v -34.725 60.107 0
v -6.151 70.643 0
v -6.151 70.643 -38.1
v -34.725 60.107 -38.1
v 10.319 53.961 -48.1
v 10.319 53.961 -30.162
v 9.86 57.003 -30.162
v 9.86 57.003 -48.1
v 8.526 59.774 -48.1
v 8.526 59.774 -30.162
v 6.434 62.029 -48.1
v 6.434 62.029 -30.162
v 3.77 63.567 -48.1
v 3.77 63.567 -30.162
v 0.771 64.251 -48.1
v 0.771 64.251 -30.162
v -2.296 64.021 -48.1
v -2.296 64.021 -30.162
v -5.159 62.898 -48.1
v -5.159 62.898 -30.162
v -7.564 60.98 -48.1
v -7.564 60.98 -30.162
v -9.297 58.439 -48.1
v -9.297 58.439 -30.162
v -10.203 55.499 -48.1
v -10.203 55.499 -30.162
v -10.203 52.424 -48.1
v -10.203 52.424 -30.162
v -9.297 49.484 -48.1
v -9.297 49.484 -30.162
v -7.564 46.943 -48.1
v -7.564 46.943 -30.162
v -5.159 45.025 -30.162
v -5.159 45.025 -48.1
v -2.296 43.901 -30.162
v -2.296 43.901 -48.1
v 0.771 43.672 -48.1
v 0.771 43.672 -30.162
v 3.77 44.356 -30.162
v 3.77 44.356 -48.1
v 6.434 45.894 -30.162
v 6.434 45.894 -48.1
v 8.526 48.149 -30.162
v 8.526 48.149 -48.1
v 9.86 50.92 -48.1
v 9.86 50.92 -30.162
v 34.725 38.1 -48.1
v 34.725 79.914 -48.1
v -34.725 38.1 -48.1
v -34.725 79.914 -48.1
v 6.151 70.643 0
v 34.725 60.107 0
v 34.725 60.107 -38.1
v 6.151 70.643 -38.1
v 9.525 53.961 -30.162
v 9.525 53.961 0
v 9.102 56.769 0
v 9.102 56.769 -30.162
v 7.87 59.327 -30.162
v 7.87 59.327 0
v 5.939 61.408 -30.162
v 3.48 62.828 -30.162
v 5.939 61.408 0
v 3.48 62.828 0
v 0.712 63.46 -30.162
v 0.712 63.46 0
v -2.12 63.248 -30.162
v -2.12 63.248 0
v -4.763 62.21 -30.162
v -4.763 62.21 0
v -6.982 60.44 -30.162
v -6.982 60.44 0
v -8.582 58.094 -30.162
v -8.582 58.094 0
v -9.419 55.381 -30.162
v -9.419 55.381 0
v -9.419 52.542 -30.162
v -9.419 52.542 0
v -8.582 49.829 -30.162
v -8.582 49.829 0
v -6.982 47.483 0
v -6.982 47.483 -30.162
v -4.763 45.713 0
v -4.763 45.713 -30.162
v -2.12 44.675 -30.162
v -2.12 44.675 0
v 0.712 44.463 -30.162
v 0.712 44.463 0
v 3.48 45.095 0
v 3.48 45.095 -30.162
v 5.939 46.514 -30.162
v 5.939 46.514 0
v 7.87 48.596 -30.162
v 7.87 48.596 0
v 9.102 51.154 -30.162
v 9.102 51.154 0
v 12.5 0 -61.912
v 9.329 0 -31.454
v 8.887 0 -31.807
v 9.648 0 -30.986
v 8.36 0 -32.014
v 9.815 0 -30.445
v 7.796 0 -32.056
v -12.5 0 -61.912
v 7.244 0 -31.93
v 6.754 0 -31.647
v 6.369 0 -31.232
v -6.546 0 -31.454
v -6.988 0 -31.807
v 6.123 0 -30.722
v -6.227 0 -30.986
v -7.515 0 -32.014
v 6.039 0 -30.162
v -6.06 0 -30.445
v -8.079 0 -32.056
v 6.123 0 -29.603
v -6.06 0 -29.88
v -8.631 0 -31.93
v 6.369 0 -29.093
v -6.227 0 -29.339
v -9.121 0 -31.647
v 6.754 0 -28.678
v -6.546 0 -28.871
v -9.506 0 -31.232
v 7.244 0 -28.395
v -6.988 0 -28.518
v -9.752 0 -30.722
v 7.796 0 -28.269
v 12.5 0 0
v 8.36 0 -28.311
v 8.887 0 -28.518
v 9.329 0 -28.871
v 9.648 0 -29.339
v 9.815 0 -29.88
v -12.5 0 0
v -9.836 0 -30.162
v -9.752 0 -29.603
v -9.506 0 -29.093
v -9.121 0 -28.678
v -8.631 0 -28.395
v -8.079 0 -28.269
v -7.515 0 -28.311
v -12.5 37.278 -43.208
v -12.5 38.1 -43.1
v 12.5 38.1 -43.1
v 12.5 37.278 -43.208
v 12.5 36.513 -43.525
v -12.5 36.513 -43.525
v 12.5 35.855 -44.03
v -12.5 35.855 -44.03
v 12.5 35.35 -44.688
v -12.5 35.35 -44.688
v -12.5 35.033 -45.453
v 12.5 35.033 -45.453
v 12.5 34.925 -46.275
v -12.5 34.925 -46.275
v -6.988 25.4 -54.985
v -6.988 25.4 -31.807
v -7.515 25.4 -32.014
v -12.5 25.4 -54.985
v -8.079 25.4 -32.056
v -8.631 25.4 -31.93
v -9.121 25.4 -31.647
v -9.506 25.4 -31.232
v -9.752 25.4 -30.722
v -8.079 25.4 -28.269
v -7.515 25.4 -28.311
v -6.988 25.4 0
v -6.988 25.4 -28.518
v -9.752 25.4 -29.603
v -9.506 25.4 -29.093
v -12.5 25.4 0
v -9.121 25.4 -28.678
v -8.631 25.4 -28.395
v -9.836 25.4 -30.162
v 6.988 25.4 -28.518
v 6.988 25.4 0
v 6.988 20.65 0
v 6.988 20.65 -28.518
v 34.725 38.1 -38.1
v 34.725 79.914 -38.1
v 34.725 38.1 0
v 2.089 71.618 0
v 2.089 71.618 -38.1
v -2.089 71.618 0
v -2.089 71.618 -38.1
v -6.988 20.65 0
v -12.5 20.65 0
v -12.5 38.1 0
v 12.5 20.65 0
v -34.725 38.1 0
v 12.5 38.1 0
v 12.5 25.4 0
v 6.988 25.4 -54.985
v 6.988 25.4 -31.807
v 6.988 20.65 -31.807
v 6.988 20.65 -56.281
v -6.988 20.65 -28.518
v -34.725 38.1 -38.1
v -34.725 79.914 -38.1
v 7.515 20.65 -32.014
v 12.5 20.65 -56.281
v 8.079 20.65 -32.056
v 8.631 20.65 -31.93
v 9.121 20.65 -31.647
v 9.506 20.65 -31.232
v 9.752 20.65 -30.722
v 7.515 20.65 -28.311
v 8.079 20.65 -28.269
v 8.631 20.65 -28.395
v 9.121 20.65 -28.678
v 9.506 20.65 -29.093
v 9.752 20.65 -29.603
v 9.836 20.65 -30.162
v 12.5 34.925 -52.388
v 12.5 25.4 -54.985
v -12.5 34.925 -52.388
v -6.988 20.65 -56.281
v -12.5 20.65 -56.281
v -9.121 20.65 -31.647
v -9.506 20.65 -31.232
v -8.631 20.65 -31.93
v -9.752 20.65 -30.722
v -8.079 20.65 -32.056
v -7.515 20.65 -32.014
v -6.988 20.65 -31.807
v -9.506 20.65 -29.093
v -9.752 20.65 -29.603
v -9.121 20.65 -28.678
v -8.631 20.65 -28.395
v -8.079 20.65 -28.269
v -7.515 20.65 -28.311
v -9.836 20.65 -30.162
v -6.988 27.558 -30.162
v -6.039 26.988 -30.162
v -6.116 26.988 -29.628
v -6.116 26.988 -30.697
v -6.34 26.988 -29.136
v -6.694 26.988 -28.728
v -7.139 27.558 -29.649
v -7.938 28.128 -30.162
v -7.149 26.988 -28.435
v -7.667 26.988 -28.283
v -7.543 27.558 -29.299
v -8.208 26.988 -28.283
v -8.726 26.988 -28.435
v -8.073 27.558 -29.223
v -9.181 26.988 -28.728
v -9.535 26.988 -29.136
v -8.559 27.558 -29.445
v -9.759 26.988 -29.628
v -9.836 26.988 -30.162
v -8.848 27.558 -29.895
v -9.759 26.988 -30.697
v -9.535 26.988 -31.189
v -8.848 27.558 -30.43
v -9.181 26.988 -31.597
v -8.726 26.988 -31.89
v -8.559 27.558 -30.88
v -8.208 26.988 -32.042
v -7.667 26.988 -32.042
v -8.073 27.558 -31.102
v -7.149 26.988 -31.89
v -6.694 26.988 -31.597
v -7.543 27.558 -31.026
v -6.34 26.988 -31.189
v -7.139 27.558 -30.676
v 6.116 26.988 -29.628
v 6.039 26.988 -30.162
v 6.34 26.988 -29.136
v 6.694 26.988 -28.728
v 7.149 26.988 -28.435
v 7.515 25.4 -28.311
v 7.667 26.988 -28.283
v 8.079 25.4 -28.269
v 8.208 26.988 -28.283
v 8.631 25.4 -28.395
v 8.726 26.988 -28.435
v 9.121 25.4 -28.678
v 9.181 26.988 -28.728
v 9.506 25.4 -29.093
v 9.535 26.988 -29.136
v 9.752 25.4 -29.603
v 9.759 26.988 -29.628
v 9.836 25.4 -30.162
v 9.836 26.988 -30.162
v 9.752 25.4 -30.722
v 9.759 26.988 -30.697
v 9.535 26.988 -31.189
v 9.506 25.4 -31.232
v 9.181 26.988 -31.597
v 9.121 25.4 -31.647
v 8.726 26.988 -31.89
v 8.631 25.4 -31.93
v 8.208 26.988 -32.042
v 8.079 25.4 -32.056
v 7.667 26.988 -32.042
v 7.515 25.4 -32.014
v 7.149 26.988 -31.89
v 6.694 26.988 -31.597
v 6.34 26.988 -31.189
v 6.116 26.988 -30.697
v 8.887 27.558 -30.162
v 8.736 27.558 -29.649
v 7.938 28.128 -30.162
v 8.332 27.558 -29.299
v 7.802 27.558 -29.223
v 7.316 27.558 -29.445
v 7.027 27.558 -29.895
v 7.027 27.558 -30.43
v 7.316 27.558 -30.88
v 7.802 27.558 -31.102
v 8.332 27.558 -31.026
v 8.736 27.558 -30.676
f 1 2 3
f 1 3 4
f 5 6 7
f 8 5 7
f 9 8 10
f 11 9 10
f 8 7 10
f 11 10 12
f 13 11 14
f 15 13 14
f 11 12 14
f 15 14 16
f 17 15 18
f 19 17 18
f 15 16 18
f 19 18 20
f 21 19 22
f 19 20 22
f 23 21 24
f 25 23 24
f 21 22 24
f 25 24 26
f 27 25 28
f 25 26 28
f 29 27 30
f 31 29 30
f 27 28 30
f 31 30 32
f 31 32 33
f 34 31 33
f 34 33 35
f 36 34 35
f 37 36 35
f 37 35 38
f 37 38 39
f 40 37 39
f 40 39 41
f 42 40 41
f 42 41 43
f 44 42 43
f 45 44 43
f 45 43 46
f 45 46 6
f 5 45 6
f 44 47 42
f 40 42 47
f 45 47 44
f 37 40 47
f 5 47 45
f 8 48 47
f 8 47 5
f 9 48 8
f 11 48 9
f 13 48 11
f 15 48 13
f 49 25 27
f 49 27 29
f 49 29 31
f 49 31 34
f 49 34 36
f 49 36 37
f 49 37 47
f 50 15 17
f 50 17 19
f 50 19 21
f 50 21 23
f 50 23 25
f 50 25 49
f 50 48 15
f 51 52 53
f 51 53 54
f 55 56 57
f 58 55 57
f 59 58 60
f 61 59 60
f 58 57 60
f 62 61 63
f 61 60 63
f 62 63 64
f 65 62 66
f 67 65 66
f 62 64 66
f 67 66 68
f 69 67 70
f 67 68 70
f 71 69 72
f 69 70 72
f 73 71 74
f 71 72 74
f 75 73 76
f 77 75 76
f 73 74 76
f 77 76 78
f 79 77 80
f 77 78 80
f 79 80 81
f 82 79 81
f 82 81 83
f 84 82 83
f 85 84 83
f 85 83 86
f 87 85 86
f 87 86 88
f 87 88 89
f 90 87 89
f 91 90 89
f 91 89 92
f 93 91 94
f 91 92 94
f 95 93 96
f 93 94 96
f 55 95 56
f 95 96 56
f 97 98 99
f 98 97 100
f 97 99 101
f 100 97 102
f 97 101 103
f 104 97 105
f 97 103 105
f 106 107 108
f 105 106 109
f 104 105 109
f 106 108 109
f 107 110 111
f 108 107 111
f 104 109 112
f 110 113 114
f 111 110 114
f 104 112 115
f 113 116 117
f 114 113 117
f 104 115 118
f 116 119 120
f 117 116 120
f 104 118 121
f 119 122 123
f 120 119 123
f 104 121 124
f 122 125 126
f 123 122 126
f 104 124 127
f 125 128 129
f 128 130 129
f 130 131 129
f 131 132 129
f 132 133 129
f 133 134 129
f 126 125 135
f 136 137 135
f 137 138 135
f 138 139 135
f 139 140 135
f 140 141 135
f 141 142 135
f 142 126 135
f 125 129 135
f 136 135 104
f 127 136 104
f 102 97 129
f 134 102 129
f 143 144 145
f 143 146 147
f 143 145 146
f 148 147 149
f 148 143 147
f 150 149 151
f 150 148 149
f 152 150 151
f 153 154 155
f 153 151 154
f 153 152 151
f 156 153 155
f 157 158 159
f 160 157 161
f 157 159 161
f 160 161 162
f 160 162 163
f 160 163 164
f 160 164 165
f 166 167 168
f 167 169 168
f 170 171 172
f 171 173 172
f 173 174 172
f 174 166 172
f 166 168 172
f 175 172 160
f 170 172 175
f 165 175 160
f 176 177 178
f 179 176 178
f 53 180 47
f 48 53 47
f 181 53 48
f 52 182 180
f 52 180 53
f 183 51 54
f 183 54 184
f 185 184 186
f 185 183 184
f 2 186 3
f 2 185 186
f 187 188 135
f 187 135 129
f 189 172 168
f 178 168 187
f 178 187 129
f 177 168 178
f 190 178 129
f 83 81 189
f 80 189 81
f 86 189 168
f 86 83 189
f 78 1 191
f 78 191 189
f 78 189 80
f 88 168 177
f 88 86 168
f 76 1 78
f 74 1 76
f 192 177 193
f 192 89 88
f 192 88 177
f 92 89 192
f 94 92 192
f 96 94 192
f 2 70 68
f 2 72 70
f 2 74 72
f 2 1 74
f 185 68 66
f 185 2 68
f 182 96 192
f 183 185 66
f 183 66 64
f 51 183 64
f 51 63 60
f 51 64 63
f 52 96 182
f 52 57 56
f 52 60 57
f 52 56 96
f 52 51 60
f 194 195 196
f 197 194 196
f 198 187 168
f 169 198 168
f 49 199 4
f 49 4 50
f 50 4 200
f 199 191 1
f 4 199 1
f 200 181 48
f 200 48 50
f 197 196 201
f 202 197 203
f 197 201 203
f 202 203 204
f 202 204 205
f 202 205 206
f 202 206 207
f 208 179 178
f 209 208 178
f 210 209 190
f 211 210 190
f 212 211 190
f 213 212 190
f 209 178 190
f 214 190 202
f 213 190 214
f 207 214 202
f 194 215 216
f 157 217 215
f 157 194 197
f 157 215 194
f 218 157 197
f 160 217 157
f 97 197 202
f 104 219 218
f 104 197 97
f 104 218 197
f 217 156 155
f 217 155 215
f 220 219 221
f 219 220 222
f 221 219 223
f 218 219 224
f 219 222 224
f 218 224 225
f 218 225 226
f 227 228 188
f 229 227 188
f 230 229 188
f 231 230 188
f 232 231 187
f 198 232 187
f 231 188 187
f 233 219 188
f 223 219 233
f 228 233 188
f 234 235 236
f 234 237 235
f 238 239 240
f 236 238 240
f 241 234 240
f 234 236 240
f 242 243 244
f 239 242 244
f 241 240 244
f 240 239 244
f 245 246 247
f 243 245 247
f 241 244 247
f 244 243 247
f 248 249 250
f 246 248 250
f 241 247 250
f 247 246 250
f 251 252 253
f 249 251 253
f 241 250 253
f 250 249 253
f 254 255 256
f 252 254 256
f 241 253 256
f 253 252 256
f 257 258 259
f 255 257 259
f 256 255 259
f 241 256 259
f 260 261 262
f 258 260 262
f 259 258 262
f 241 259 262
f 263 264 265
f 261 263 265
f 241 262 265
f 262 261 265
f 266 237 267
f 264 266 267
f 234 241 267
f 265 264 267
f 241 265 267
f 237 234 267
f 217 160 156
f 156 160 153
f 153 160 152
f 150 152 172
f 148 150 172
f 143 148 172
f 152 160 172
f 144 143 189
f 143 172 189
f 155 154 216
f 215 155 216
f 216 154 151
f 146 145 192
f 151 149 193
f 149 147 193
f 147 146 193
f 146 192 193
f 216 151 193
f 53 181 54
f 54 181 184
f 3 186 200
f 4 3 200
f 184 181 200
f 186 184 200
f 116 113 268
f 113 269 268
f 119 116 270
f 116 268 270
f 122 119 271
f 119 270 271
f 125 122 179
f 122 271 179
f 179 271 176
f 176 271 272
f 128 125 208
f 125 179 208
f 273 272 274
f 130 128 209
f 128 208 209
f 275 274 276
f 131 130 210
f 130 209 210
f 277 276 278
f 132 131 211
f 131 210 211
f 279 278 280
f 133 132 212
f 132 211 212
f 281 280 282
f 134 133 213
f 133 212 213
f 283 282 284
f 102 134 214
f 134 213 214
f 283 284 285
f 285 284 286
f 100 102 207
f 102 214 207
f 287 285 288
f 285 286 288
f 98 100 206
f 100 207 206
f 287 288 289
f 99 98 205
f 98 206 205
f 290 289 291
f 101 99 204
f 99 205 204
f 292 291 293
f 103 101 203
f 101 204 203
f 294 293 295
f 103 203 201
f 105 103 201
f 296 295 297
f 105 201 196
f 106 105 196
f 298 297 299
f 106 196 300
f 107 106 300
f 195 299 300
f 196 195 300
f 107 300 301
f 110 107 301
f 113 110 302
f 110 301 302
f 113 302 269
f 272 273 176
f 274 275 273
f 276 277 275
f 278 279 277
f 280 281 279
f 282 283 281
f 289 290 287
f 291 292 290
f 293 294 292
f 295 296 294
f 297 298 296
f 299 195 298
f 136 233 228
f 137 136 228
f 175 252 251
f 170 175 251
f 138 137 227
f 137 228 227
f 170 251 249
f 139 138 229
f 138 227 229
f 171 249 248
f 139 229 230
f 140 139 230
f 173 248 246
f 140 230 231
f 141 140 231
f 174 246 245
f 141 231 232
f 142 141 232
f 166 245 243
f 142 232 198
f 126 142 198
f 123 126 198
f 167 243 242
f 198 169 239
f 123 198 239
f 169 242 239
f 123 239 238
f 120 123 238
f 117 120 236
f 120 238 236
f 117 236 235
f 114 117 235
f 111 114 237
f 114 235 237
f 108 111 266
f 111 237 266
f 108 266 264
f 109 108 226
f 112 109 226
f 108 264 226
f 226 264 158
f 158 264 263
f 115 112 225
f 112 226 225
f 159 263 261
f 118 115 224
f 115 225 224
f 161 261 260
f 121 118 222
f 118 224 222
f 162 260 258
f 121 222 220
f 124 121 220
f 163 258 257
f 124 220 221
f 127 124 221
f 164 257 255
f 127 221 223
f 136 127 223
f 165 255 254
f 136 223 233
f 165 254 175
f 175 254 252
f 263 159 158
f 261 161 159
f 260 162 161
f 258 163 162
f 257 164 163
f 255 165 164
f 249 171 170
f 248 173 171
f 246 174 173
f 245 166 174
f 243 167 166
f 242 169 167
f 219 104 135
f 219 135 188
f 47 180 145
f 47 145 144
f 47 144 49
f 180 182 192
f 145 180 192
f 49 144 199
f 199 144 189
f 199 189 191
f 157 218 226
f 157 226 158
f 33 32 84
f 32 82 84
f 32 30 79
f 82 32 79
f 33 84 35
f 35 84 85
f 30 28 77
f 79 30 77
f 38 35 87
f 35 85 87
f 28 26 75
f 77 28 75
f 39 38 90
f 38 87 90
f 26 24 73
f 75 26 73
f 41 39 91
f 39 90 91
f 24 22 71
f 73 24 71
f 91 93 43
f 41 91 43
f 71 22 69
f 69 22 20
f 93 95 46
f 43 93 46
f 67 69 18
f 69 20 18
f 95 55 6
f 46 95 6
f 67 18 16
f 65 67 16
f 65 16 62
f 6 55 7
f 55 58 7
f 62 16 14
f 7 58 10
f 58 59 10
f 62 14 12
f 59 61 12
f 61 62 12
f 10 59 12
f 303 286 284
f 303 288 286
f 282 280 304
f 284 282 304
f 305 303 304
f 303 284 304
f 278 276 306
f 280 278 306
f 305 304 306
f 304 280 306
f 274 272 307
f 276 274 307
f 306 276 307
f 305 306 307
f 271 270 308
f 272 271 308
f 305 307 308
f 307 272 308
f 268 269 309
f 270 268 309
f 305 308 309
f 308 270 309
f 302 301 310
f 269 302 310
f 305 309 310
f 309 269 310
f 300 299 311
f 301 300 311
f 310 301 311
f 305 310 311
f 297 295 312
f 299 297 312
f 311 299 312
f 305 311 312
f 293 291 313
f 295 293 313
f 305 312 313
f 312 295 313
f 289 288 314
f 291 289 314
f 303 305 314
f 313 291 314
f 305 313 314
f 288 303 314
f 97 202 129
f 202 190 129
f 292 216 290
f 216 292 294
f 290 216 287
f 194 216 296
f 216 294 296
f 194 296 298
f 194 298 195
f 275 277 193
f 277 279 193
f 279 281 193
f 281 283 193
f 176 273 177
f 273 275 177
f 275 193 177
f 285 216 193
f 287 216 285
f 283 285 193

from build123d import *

# Parameters (mm, degrees)
EXTRUDE1_DEPTH                   = 38.1
EXTRUDE2_DEPTH                   = 38.1
SKETCH4_W                        = 69.45
SKETCH4_H                        = 41.814012965
EXTRUDE3_DEPTH                   = 10
EXTRUDE4_DEPTH                   = 23.8125
CUT_EXTRUDE4_DEPTH               = 107.888880382
CUT_EXTRUDE4_DEPTH_BACK          = 107.888880382
F_25_0_1495_DIAMETER_HOLE1_D     = 3.7973
F_25_0_1495_DIAMETER_HOLE1_DEPTH = 26.9875
F_25_0_1495_DIAMETER_HOLE1_TIP   = 1.140824014
SKETCH11_R                       = 9.525
CUT_EXTRUDE2_DEPTH               = 30.1625
SKETCH12_R                       = 10.31875
CUT_EXTRUDE3_DEPTH               = 93.736926805
CUT_EXTRUDE5_START               = -12.5
CUT_EXTRUDE5_DEPTH               = 25


# Read off the part's stored shape, not the designer's step: Cut-Extrude5
with BuildPart() as part:
    # Sketch1 → Extrude1 (new body)
    with BuildSketch(Plane.XY):
        Polygon((12.5, 0), (-12.5, 0), (-12.5, 20.6502), (-6.9882, 20.6502), (-6.9882, 25.4), (-12.5, 25.4), (-12.5, 38.1), (-34.725, 38.1), (-34.725, 49.506590038), (34.725, 49.506590038), (34.725, 38.1), (12.5, 38.1), (12.5, 25.4), (6.9882, 25.4), (6.9882, 20.6502), (12.5, 20.6502), align=None)
    extrude(amount=-EXTRUDE1_DEPTH)

    # Sketch2 → Extrude2 (add)
    with BuildSketch(Plane.XY):
        with BuildLine():
            Line((-34.725, 60.107063342), (-34.725, 49.506590038))
            Line((-34.725, 49.506590038), (34.725, 49.506590038))
            Line((34.725, 49.506590038), (34.725, 60.107063342))
            Line((34.725, 60.107063342), (6.151391783, 70.643423952))
            ThreePointArc((6.151391783, 70.643423952), (0, 71.741434289), (-6.151391783, 70.643423952))
            Line((-6.151391783, 70.643423952), (-34.725, 60.107063342))
        make_face()
    extrude(amount=-EXTRUDE2_DEPTH)

    # Sketch4 → Extrude3 (add)
    with BuildSketch(Plane(origin=(0, 0, -38.1), x_dir=(-1, 0, 0), z_dir=(0, 0, -1))):
        with Locations((0, 59.007006483)):
            Rectangle(SKETCH4_W, SKETCH4_H)
    extrude(amount=EXTRUDE3_DEPTH)

    # Sketch13 → Extrude4 (add)
    with BuildSketch(Plane(origin=(0, 0, -38.1), x_dir=(-1, 0, 0), z_dir=(0, 0, -1))):
        Polygon((12.5, 38.1), (-12.5, 38.1), (-12.5, 25.4), (-6.9882, 25.4), (-6.9882, 20.6502), (-12.5, 20.6502), (-12.5, 0), (12.5, 0), (12.5, 20.6502), (6.9882, 20.6502), (6.9882, 25.4), (12.5, 25.4), align=None)
    extrude(amount=EXTRUDE4_DEPTH)

    # Sketch14 → Cut-Extrude4 (cut, two sides: drawn at the far end of the back side and taken through both)
    with BuildSketch(Plane(origin=(0, 0, 0), x_dir=(0, 0, -1), z_dir=(1, 0, 0)).offset(-CUT_EXTRUDE4_DEPTH_BACK)):
        with BuildLine():
            Line((61.9125, 38.1), (43.1, 38.1))
            ThreePointArc((43.1, 38.1), (44.02993597, 35.85493597), (46.275, 34.925))
            Line((46.275, 34.925), (61.9125, 34.925))
            Line((61.9125, 34.925), (61.9125, 38.1))
        make_face()
    extrude(amount=CUT_EXTRUDE4_DEPTH + CUT_EXTRUDE4_DEPTH_BACK, mode=Mode.SUBTRACT)

    # #25 (0.1495) Diameter Hole1
    with Locations(Plane.XZ):
        with Locations((-7.9375, -30.1625), (7.9375, -30.1625)):
            Hole(F_25_0_1495_DIAMETER_HOLE1_D / 2, depth=F_25_0_1495_DIAMETER_HOLE1_DEPTH)
            with Locations((0, 0, -(F_25_0_1495_DIAMETER_HOLE1_DEPTH + F_25_0_1495_DIAMETER_HOLE1_TIP / 2))):  # 118° drill point
                Cone(0, F_25_0_1495_DIAMETER_HOLE1_D / 2, F_25_0_1495_DIAMETER_HOLE1_TIP, mode=Mode.SUBTRACT)

    # Sketch11 → Cut-Extrude2 (cut)
    with BuildSketch(Plane.XY):
        with Locations((0, 53.961434289)):
            Circle(SKETCH11_R)
    extrude(amount=-CUT_EXTRUDE2_DEPTH, mode=Mode.SUBTRACT)

    # Sketch12 → Cut-Extrude3 (cut, through all)
    with BuildSketch(Plane.XY.offset(-30.1625)):
        with Locations((0, 53.961434289)):
            Circle(SKETCH12_R)
    extrude(amount=-CUT_EXTRUDE3_DEPTH, mode=Mode.SUBTRACT)

    # Cut-Extrude5 outline → Cut-Extrude5 (cut)
    with BuildSketch(Plane(origin=(0, 0, 0), x_dir=(0, 0, -1), z_dir=(1, 0, 0)).offset(CUT_EXTRUDE5_START)):
        Polygon((61.9125, 34.925), (52.3875, 34.925), (61.9125, 0), align=None)
    extrude(amount=CUT_EXTRUDE5_DEPTH, mode=Mode.SUBTRACT)


solid = part.part
